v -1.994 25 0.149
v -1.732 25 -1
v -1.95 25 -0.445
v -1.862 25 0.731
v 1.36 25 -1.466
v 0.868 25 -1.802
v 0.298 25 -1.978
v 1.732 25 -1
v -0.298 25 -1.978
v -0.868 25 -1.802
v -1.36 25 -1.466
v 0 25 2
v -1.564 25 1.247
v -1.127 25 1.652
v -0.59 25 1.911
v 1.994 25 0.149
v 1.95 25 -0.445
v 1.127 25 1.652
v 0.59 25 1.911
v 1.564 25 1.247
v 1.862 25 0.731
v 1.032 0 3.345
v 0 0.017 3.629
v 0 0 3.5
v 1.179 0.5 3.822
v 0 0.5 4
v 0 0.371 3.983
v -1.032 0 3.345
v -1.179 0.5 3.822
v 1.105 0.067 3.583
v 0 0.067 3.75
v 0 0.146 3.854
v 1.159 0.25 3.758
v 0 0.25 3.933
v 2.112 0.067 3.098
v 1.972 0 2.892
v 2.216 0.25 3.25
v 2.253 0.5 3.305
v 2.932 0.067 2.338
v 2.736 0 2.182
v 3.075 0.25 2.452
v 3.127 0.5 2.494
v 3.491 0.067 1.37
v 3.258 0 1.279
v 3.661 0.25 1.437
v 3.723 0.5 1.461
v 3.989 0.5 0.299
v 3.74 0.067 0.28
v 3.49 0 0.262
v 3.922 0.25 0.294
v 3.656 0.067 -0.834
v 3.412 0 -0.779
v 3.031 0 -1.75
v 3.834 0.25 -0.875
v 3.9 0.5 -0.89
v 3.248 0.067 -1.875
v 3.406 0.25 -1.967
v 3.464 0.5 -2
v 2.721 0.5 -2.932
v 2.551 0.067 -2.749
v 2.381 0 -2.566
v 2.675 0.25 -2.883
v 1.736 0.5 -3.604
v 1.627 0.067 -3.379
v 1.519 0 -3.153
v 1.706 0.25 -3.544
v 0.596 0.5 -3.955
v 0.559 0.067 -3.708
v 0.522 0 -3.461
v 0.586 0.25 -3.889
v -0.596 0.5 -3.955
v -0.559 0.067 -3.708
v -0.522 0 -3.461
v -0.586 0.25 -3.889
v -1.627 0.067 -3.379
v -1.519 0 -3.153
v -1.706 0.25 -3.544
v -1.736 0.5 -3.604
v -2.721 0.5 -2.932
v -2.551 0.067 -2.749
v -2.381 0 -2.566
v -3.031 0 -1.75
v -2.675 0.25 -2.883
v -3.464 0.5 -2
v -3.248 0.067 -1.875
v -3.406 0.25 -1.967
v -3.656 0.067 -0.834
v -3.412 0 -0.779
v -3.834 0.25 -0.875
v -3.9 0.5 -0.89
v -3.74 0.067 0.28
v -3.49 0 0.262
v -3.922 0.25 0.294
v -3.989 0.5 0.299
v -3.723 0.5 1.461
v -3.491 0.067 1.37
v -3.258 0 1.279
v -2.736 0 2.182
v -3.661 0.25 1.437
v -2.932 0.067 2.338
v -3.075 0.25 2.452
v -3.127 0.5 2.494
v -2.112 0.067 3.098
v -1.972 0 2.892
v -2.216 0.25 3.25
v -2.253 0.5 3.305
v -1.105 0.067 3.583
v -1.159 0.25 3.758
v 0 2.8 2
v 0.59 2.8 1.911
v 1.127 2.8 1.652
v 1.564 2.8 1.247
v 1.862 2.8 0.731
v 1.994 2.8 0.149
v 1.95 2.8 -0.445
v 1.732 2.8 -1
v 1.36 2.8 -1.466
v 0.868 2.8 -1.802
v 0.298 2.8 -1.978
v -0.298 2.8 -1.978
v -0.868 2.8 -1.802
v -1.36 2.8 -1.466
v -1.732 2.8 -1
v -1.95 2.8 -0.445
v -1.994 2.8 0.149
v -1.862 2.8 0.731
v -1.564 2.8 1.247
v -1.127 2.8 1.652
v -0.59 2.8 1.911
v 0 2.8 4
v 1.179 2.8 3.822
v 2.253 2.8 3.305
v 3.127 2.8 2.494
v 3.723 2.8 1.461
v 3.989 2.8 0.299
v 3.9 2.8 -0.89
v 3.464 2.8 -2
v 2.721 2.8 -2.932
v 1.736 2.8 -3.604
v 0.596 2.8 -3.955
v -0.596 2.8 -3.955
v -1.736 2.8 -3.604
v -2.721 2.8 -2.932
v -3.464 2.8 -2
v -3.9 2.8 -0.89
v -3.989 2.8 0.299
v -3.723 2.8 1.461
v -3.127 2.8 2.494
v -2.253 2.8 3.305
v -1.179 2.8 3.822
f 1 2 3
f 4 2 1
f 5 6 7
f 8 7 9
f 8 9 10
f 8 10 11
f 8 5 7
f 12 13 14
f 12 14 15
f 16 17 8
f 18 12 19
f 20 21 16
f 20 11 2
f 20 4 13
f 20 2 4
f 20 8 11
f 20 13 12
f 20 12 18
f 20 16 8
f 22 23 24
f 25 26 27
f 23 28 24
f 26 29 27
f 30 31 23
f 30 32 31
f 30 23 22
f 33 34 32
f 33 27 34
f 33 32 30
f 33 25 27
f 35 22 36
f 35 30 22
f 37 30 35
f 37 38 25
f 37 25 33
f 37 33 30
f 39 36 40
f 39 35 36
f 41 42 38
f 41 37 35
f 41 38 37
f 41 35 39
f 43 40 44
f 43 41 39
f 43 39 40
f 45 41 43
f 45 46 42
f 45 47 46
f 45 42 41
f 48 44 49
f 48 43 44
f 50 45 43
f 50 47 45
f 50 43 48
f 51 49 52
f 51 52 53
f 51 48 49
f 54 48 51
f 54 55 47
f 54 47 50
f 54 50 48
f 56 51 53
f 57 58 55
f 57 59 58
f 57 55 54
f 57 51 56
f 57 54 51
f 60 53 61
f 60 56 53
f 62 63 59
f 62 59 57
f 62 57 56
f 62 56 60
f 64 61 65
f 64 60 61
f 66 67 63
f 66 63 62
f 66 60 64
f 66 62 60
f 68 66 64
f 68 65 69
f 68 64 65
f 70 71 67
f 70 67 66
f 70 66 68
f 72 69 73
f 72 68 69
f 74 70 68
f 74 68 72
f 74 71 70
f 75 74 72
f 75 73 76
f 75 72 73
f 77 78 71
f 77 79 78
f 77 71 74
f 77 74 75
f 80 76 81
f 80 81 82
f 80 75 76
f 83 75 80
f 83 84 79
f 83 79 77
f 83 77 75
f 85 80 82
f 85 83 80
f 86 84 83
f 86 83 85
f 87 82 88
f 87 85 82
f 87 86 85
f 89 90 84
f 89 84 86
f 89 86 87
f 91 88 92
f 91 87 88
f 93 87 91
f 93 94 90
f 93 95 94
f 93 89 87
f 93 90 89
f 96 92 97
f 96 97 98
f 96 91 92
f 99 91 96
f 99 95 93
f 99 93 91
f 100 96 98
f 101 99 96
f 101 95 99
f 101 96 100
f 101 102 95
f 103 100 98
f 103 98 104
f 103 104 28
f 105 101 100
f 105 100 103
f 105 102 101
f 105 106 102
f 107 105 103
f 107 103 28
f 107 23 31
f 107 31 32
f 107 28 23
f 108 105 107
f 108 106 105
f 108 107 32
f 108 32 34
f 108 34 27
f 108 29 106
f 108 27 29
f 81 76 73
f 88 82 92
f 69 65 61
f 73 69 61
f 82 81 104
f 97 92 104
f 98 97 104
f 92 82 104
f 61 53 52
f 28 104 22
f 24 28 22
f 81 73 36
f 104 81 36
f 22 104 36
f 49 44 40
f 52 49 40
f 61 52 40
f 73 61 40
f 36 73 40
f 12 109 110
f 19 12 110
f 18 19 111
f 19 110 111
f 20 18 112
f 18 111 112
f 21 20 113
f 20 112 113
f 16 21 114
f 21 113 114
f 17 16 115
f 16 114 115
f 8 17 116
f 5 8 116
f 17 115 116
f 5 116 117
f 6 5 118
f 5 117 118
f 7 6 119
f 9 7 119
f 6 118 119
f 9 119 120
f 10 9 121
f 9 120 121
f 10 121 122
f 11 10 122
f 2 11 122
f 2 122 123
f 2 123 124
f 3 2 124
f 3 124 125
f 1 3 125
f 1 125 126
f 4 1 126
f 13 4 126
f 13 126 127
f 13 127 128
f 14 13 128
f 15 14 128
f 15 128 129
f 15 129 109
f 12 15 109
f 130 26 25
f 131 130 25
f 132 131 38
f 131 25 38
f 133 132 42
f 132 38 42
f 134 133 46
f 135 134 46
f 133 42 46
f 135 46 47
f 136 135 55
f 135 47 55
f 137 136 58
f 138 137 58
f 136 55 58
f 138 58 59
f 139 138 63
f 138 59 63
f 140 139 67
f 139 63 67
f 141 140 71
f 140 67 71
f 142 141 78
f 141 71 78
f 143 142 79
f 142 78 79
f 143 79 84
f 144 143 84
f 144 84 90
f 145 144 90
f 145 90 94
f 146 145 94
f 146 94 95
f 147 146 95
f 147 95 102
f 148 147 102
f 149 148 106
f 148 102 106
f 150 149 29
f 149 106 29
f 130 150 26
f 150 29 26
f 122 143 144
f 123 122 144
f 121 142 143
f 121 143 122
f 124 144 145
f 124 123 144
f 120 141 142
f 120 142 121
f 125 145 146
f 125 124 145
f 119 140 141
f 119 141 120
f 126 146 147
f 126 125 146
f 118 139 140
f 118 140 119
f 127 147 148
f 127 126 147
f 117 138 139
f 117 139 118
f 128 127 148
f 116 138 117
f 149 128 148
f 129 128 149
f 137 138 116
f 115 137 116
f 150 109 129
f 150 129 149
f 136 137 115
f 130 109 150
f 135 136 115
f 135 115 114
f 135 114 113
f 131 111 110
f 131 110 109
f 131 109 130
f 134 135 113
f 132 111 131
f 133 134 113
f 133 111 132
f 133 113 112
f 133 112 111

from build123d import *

# Parameters (mm, degrees)
SKETCH_1_R      = 4
EXTRUDE_1_DEPTH = 2.8
SKETCH_1_3_R    = 2
EXTRUDE_2_DEPTH = 25
FILLET_1_R      = 0.5


with BuildPart() as part:
    # 草图1 → 凸台-拉伸1 (new body)
    with BuildSketch(Plane(origin=(0, 0, 0), x_dir=(1, 0, 0), z_dir=(0, 1, 0))):
        Circle(SKETCH_1_R)
    extrude(amount=EXTRUDE_1_DEPTH)

    # 草图1<3> → 凸台-拉伸2 (add)
    with BuildSketch(Plane(origin=(0, 0, 0), x_dir=(1, 0, 0), z_dir=(0, 1, 0))):
        Circle(SKETCH_1_3_R)
    extrude(amount=EXTRUDE_2_DEPTH)

    # 圆角1
    fillet_1_edges = [part.edges().sort_by_distance(p)[0] for p in [
        (-4, 0, 0),
    ]]
    fillet(fillet_1_edges, radius=FILLET_1_R)


solid = part.part
